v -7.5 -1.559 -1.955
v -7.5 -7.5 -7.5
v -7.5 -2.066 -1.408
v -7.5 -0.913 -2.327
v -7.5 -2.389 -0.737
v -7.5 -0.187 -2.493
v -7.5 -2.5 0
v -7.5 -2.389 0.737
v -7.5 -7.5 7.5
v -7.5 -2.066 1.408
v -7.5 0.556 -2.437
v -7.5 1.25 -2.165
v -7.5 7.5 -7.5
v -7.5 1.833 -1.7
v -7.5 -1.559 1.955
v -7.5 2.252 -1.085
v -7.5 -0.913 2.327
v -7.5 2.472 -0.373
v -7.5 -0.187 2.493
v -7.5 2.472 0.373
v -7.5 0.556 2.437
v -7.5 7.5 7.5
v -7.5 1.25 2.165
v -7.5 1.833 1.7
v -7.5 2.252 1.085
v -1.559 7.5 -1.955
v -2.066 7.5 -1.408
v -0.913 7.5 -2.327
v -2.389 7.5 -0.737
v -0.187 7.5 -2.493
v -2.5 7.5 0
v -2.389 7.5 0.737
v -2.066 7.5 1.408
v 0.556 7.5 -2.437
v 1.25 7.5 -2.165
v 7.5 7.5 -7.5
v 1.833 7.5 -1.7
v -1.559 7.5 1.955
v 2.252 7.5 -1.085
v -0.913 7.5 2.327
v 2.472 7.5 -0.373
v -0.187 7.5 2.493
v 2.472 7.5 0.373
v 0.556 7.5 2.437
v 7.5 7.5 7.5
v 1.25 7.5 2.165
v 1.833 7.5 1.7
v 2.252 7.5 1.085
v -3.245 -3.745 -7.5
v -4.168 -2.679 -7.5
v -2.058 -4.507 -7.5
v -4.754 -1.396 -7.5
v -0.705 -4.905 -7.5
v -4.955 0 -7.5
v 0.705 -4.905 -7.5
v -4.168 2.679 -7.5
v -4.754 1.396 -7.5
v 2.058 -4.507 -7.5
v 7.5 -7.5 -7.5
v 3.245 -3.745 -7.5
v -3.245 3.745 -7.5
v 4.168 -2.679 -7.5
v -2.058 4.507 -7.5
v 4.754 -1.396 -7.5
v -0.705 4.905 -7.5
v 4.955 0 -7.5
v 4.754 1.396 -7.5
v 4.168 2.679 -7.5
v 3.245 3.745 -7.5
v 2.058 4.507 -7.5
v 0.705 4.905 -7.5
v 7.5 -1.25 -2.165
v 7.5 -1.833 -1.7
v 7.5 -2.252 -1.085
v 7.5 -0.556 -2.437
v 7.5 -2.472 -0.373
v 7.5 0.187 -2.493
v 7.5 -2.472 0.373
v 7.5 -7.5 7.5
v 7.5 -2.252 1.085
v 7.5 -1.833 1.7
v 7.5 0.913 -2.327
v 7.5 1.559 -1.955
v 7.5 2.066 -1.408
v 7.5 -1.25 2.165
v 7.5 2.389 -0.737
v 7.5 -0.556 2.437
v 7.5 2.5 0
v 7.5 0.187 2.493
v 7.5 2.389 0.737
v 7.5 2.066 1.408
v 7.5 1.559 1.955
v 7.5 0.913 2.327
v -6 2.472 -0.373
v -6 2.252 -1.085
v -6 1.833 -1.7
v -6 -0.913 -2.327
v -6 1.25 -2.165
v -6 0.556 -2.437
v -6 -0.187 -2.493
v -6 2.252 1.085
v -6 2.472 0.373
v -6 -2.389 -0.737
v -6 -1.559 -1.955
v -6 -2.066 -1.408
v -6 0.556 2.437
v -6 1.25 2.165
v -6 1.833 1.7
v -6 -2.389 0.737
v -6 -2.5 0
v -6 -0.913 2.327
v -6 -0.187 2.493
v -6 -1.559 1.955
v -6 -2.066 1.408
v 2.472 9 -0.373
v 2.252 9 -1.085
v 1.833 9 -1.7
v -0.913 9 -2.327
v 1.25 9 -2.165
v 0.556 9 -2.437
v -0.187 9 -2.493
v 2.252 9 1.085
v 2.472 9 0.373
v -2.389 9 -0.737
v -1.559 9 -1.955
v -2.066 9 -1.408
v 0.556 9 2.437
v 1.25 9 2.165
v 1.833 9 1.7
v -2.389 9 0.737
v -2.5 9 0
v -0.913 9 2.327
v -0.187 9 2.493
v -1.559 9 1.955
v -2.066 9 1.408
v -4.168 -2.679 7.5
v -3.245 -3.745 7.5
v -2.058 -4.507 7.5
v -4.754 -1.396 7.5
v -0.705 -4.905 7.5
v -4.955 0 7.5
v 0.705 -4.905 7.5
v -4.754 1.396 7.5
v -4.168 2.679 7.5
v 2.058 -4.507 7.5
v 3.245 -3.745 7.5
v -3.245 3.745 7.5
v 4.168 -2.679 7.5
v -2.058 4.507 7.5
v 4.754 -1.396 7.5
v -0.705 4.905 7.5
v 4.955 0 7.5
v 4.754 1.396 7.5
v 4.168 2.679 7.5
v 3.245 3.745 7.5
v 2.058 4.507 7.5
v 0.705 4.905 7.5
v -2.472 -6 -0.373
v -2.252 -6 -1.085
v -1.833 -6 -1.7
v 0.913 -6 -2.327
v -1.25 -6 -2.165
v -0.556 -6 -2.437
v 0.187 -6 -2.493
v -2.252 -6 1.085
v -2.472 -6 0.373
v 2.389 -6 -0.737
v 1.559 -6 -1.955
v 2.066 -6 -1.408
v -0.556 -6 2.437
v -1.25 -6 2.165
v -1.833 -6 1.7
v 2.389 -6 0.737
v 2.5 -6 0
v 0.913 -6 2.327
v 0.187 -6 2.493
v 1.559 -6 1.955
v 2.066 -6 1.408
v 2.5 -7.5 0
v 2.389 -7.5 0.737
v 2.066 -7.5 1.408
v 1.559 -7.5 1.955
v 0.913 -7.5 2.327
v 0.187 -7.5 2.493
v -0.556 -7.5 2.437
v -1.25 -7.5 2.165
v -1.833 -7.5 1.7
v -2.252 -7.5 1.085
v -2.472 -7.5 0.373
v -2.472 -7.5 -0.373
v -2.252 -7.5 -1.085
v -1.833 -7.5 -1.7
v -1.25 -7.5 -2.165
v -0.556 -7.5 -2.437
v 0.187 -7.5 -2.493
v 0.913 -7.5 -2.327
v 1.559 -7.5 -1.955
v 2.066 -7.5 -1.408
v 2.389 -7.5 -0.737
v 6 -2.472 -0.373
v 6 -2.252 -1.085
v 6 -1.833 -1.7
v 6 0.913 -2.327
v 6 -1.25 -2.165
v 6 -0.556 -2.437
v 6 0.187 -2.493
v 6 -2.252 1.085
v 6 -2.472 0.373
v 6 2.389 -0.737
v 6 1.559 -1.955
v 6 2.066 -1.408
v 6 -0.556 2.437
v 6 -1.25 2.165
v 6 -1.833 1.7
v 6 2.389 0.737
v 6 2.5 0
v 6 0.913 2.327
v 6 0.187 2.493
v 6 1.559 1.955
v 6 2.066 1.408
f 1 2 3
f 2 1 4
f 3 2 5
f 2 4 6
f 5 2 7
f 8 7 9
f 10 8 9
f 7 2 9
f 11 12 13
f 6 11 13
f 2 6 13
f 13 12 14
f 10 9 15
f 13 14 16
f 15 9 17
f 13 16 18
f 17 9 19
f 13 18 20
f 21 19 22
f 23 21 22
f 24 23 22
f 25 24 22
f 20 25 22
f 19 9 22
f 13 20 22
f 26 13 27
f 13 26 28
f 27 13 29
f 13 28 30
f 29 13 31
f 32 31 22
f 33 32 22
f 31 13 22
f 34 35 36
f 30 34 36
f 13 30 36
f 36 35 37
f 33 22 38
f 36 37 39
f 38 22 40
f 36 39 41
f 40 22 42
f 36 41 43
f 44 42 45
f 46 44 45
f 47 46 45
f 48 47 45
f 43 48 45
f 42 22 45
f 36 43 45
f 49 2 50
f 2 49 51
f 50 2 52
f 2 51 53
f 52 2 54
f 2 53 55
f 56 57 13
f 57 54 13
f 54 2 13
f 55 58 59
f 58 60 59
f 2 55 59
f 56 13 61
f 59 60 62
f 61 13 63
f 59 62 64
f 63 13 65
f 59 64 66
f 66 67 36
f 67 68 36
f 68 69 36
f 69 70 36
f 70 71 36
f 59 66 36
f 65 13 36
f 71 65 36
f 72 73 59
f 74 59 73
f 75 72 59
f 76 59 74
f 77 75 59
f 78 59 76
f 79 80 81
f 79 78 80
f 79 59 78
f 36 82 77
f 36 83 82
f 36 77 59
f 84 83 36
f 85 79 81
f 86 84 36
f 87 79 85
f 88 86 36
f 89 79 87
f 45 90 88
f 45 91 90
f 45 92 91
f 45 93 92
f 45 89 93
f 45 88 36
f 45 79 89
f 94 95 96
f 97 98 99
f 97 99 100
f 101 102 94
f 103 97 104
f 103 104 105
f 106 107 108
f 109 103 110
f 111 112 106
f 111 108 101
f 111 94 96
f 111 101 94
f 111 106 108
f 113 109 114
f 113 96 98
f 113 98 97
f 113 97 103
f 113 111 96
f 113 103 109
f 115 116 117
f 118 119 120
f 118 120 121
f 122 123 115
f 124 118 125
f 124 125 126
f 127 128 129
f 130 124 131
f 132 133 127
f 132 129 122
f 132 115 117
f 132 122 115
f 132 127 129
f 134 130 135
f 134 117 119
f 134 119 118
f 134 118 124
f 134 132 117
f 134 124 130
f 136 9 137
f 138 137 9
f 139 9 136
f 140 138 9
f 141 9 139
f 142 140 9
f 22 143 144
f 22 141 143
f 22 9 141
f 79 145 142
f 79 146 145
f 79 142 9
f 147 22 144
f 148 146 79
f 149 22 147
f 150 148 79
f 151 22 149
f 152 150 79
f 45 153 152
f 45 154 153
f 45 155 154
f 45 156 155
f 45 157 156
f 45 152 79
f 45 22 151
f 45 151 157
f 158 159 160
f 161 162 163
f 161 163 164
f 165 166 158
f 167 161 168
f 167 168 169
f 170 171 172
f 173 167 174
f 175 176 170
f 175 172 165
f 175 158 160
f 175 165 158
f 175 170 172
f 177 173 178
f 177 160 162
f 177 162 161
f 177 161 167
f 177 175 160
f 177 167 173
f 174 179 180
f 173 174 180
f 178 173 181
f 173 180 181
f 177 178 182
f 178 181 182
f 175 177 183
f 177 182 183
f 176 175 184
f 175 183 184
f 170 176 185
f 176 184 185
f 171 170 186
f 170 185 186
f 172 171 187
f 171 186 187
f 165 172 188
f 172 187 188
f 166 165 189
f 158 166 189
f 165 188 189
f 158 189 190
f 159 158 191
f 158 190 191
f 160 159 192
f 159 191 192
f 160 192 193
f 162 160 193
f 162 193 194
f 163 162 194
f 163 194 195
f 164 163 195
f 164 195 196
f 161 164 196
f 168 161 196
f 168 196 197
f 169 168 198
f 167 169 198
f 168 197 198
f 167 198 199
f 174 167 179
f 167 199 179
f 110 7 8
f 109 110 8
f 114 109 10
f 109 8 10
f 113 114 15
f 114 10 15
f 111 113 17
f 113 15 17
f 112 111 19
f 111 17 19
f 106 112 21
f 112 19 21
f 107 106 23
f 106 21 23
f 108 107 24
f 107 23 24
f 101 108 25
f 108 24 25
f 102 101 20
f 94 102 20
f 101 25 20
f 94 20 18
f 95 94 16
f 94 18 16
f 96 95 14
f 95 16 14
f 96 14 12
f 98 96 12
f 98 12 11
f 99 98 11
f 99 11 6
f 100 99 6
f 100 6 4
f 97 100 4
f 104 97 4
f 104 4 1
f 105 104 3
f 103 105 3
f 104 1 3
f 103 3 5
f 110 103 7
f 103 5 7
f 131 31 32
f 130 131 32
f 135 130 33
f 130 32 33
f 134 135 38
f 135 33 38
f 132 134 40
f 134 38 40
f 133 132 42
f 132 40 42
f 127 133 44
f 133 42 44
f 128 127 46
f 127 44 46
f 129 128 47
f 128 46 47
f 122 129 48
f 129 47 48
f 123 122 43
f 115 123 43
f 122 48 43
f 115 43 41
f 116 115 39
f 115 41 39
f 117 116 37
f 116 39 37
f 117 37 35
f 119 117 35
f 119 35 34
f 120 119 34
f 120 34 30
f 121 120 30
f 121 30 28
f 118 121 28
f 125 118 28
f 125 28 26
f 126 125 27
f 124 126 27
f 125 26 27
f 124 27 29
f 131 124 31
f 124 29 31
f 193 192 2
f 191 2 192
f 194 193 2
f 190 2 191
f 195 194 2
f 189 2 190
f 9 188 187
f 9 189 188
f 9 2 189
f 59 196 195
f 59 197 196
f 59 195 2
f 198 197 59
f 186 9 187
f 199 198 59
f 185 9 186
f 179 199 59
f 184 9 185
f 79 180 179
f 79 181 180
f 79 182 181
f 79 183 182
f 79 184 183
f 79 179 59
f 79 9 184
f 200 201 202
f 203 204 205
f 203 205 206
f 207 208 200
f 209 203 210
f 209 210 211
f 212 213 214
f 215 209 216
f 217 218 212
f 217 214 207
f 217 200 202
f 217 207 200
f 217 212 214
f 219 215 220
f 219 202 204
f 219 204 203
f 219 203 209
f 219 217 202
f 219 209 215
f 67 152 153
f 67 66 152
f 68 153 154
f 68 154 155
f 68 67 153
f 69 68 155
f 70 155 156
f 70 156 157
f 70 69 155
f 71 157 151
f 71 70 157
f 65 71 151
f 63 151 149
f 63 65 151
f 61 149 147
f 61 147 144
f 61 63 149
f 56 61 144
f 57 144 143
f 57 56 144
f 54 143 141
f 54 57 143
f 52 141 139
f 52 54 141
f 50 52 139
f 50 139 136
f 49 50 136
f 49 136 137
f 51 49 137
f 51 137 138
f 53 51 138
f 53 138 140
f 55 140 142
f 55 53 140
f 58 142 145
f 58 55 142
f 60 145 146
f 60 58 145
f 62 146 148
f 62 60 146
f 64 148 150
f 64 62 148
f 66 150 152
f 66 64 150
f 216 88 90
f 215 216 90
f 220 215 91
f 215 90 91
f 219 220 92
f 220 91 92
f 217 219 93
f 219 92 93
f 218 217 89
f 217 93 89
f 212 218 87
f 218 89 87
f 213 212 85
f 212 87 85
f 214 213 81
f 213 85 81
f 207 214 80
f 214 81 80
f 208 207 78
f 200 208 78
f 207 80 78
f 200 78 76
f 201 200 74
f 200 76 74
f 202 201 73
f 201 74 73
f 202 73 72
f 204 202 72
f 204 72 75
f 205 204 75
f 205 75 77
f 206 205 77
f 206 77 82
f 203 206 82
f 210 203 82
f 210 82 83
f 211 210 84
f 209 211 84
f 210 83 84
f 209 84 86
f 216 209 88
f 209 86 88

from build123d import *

# Parameters (mm, degrees)
F0_W     = 15
F0_H     = 15
F0_R     = 4.955
F1_DEPTH = 7.5
F2_R     = 2.5
F3_DEPTH = 1.5
F4_R     = 2.5
F5_DEPTH = 1.5
F6_R     = 2.5
F7_DEPTH = 1.5
F8_R     = 2.5
F9_DEPTH = 1.5


with BuildPart() as f1:
    # F0 (on Top) → F1 (new body, symmetric)
    with BuildSketch(Plane.XY):
        Rectangle(F0_W, F0_H)
        Circle(F0_R, mode=Mode.SUBTRACT)
    extrude(amount=F1_DEPTH, both=True)

    # F2 (on face) → F3 (join)
    with BuildSketch(Plane(origin=(0, 7.5, 0), x_dir=(-1, 0, 0), z_dir=(0, 1, 0))):
        Circle(F2_R)
    extrude(amount=F3_DEPTH)

    # F4 (on face) → F5 (cut)
    with BuildSketch(Plane.XZ.offset(7.5)):
        Circle(F4_R)
    extrude(amount=-F5_DEPTH, mode=Mode.SUBTRACT)

    # F6 (on face) → F7 (cut)
    with BuildSketch(Plane.YZ.offset(7.5)):
        Circle(F6_R)
    extrude(amount=-F7_DEPTH, mode=Mode.SUBTRACT)

    # F8 (on face) → F9 (cut)
    with BuildSketch(Plane(origin=(-7.5, 0, 0), x_dir=(0, -1, 0), z_dir=(-1, 0, 0))):
        Circle(F8_R)
    extrude(amount=-F9_DEPTH, mode=Mode.SUBTRACT)


solid = f1.part
